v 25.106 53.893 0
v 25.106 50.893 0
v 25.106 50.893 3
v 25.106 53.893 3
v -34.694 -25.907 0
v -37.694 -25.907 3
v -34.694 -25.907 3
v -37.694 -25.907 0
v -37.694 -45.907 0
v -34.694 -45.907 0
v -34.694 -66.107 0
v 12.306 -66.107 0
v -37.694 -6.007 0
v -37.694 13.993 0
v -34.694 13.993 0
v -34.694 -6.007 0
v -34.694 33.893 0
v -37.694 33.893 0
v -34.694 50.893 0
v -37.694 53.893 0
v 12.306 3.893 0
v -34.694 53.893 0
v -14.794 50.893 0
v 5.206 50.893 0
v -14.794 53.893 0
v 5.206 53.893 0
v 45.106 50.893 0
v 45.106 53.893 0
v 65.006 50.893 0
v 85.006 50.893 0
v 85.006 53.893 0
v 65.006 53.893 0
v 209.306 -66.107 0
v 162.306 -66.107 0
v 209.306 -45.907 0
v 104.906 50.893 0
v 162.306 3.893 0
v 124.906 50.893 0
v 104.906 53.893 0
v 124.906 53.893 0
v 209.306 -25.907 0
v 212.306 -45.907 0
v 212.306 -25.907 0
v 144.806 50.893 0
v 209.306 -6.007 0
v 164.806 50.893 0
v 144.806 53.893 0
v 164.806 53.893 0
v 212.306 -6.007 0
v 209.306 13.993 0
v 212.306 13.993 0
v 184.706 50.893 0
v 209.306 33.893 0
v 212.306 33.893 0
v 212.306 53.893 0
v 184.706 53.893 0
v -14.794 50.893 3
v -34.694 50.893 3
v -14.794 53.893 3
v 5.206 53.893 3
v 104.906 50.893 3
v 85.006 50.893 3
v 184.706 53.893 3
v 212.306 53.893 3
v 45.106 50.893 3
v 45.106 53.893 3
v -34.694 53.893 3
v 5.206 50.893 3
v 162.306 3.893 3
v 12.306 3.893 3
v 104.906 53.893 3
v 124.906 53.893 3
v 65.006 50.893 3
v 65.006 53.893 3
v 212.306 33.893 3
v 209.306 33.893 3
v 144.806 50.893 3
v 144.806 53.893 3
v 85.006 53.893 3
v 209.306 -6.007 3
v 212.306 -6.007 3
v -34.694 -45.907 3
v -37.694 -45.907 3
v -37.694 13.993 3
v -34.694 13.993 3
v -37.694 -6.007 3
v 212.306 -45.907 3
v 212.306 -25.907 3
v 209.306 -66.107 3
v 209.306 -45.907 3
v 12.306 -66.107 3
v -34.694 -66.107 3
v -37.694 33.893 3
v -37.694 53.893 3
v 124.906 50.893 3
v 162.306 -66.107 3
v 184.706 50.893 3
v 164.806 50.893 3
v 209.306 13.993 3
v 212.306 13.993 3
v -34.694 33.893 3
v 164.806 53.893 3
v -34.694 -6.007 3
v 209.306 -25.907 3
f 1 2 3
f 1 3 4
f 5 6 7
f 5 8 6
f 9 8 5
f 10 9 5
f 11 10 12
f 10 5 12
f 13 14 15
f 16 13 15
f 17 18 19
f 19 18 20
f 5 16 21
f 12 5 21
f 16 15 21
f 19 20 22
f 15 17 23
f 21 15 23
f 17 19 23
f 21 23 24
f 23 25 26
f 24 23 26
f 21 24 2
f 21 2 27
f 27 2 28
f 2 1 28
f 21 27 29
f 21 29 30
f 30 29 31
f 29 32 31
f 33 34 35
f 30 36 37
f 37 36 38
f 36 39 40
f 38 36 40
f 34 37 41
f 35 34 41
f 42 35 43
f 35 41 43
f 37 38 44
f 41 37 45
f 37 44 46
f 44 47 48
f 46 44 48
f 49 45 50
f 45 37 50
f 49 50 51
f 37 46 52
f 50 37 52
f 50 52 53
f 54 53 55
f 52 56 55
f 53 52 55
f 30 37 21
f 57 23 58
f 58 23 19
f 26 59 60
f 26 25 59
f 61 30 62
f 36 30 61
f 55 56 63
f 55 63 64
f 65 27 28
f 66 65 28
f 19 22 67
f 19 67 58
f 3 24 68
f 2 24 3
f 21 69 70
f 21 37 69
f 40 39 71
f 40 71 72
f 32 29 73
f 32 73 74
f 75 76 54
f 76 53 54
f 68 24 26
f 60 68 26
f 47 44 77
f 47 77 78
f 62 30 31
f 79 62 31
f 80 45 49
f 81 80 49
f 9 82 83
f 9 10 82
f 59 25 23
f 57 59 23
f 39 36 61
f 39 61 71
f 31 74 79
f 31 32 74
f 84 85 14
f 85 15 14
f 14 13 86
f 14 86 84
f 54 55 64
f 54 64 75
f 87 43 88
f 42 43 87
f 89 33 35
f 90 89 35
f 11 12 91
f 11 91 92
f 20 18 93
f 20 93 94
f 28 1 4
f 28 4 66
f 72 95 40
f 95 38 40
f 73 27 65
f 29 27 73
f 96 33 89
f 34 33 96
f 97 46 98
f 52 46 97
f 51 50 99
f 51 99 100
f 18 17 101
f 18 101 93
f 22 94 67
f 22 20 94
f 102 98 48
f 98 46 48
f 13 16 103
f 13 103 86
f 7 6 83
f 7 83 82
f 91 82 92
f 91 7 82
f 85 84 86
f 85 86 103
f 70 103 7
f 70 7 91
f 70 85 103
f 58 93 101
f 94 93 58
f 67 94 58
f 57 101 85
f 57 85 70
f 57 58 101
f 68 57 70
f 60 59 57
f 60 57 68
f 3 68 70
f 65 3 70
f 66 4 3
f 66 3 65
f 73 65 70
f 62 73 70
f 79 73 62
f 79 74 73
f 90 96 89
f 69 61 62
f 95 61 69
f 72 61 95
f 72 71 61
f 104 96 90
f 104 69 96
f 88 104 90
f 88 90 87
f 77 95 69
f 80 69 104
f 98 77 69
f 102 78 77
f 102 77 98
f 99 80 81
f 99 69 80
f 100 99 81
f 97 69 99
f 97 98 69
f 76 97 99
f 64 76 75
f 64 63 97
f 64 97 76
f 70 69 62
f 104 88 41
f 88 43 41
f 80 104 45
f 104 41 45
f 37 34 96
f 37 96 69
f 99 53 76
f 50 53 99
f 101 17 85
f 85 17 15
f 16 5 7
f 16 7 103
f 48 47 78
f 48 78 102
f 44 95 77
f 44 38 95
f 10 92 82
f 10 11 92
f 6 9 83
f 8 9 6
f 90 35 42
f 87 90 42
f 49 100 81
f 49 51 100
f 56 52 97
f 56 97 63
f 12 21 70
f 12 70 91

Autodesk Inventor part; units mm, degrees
ref_plane "YZ Plane" through (0, 0, 0) normal (1, 0, 0) x (0, 1, 0)
ref_plane "XZ Plane" through (0, 0, 0) normal (0, 1, 0) x (-1, 0, 0)
ref_plane "XY Plane" through (0, 0, 0) normal (0, 0, 1) x (1, 0, 0)
sketch "Sketch1" plane through (0, 0, 0) normal (0, 0, 1) x (1, 0, 0)
  line L0 (-37.6936, 53.8926) -> (212.3064, 53.8926)
  line L1 (212.3064, 53.8926) -> (212.3064, -66.1074)
  line L2 (212.3064, -66.1074) -> (-37.6936, -66.1074)
  line L3 (-37.6936, -66.1074) -> (-37.6936, 53.8926)
  line L4 (12.3064, -66.1074) -> (162.3064, -66.1074)
  line L5 (162.3064, -66.1074) -> (162.3064, 3.8926)
  line L6 (162.3064, 3.8926) -> (12.3064, 3.8926)
  line L7 (12.3064, 3.8926) -> (12.3064, -66.1074)
  line L8 (-37.6936, 53.8926) -> (-34.6936, 53.8926)
  line L9 (-34.6936, 53.8926) -> (-34.6936, 33.8926)
  line L10 (-34.6936, 33.8926) -> (-37.6936, 33.8926)
  line L11 (-37.6936, 33.8926) -> (-37.6936, 53.8926)
  line L12 (-37.6936, 33.8926) -> (-34.6936, 33.8926)
  line L13 (-34.6936, 33.8926) -> (-34.6936, 13.9926)
  line L14 (-34.6936, 13.9926) -> (-37.6936, 13.9926)
  line L15 (-37.6936, 13.9926) -> (-37.6936, 33.8926)
  line L16 (-37.6936, 13.9926) -> (-34.6936, 13.9926)
  line L17 (-34.6936, 13.9926) -> (-34.6936, -6.0074)
  line L18 (-34.6936, -6.0074) -> (-37.6936, -6.0074)
  line L19 (-37.6936, -6.0074) -> (-37.6936, 13.9926)
  line L20 (-34.6936, -6.0074) -> (-37.6936, -6.0074)
  line L21 (-37.6936, -6.0074) -> (-37.6936, -25.9074)
  line L22 (-37.6936, -25.9074) -> (-34.6936, -25.9074)
  line L23 (-34.6936, -25.9074) -> (-34.6936, -6.0074)
  line L24 (-37.6936, -25.9074) -> (-34.6936, -25.9074)
  line L25 (-34.6936, -25.9074) -> (-34.6936, -45.9074)
  line L26 (-34.6936, -45.9074) -> (-37.6936, -45.9074)
  line L27 (-37.6936, -45.9074) -> (-37.6936, -25.9074)
  line L28 (-34.6936, -45.9074) -> (-37.6936, -45.9074)
  line L29 (-37.6936, -45.9074) -> (-37.6936, -66.1074)
  line L30 (-37.6936, -66.1074) -> (-34.6936, -66.1074)
  line L31 (-34.6936, -66.1074) -> (-34.6936, -45.9074)
  line L32 (212.3064, -66.1074) -> (212.3064, 53.8926)
  line L33 (212.3064, 53.8926) -> (209.3064, 53.8926)
  line L34 (209.3064, 53.8926) -> (209.3064, 33.8926)
  line L35 (209.3064, 33.8926) -> (212.3064, 33.8926)
  line L36 (212.3064, 33.8926) -> (212.3064, 53.8926)
  line L37 (212.3064, 33.8926) -> (209.3064, 33.8926)
  line L38 (209.3064, 33.8926) -> (209.3064, 13.9926)
  line L39 (209.3064, 13.9926) -> (212.3064, 13.9926)
  line L40 (212.3064, 13.9926) -> (212.3064, 33.8926)
  line L41 (212.3064, 13.9926) -> (209.3064, 13.9926)
  line L42 (209.3064, 13.9926) -> (209.3064, -6.0074)
  line L43 (209.3064, -6.0074) -> (212.3064, -6.0074)
  line L44 (212.3064, -6.0074) -> (212.3064, 13.9926)
  line L45 (209.3064, -6.0074) -> (212.3064, -6.0074)
  line L46 (212.3064, -6.0074) -> (212.3064, -25.9074)
  line L47 (212.3064, -25.9074) -> (209.3064, -25.9074)
  line L48 (209.3064, -25.9074) -> (209.3064, -6.0074)
  line L49 (212.3064, -25.9074) -> (209.3064, -25.9074)
  line L50 (209.3064, -25.9074) -> (209.3064, -45.9074)
  line L51 (209.3064, -45.9074) -> (212.3064, -45.9074)
  line L52 (212.3064, -45.9074) -> (212.3064, -25.9074)
  line L53 (209.3064, -45.9074) -> (212.3064, -45.9074)
  line L54 (212.3064, -45.9074) -> (212.3064, -66.1074)
  line L55 (212.3064, -66.1074) -> (209.3064, -66.1074)
  line L56 (209.3064, -66.1074) -> (209.3064, -45.9074)
  line L57 (-34.6936, 53.8926) -> (-14.7936, 53.8926)
  line L58 (-14.7936, 53.8926) -> (-14.7936, 50.8926)
  line L59 (-14.7936, 50.8926) -> (-34.6936, 50.8926)
  line L60 (-34.6936, 50.8926) -> (-34.6936, 53.8926)
  line L61 (-14.7936, 50.8926) -> (5.2064, 50.8926)
  line L62 (5.2064, 50.8926) -> (5.2064, 53.8926)
  line L63 (5.2064, 53.8926) -> (-14.7936, 53.8926)
  line L64 (-14.7936, 53.8926) -> (-14.7936, 50.8926)
  line L65 (5.2064, 50.8926) -> (25.1064, 50.8926)
  line L66 (25.1064, 50.8926) -> (25.1064, 53.8926)
  line L67 (25.1064, 53.8926) -> (5.2064, 53.8926)
  line L68 (5.2064, 53.8926) -> (5.2064, 50.8926)
  line L69 (25.1064, 50.8926) -> (45.1064, 50.8926)
  line L70 (45.1064, 50.8926) -> (45.1064, 53.8926)
  line L71 (45.1064, 53.8926) -> (25.1064, 53.8926)
  line L72 (25.1064, 53.8926) -> (25.1064, 50.8926)
  line L73 (45.1064, 50.8926) -> (65.0064, 50.8926)
  line L74 (65.0064, 50.8926) -> (65.0064, 53.8926)
  line L75 (65.0064, 53.8926) -> (45.1064, 53.8926)
  line L76 (45.1064, 53.8926) -> (45.1064, 50.8926)
  line L77 (65.0064, 50.8926) -> (85.0064, 50.8926)
  line L78 (85.0064, 50.8926) -> (85.0064, 53.8926)
  line L79 (85.0064, 53.8926) -> (65.0064, 53.8926)
  line L80 (65.0064, 53.8926) -> (65.0064, 50.8926)
  line L81 (85.0064, 50.8926) -> (104.9064, 50.8926)
  line L82 (104.9064, 50.8926) -> (104.9064, 53.8926)
  line L83 (104.9064, 53.8926) -> (85.0064, 53.8926)
  line L84 (85.0064, 53.8926) -> (85.0064, 50.8926)
  line L85 (104.9064, 50.8926) -> (124.9064, 50.8926)
  line L86 (124.9064, 50.8926) -> (124.9064, 53.8926)
  line L87 (124.9064, 53.8926) -> (104.9064, 53.8926)
  line L88 (104.9064, 53.8926) -> (104.9064, 50.8926)
  line L89 (124.9064, 50.8926) -> (144.8064, 50.8926)
  line L90 (144.8064, 50.8926) -> (144.8064, 53.8926)
  line L91 (144.8064, 53.8926) -> (124.9064, 53.8926)
  line L92 (124.9064, 53.8926) -> (124.9064, 50.8926)
  line L93 (144.8064, 50.8926) -> (164.8064, 50.8926)
  line L94 (164.8064, 50.8926) -> (164.8064, 53.8926)
  line L95 (164.8064, 53.8926) -> (144.8064, 53.8926)
  line L96 (144.8064, 53.8926) -> (144.8064, 50.8926)
  line L97 (164.8064, 50.8926) -> (184.7064, 50.8926)
  line L98 (184.7064, 50.8926) -> (184.7064, 53.8926)
  line L99 (184.7064, 53.8926) -> (164.8064, 53.8926)
  line L100 (164.8064, 53.8926) -> (164.8064, 50.8926)
  line L101 (184.7064, 50.8926) -> (209.3064, 50.8926)
  line L102 (209.3064, 50.8926) -> (209.3064, 53.8926)
  line L103 (209.3064, 53.8926) -> (184.7064, 53.8926)
  line L104 (184.7064, 53.8926) -> (184.7064, 50.8926)
  point P0 (0, 0)
  point P1 (212.3064, -45.9074)
  point P2 (212.3064, -25.9074)
  point P3 (212.3064, -6.0074)
  point P4 (212.3064, 13.9926)
  point P5 (212.3064, 33.8926)
  point P6 (-37.6936, 13.9926)
  point P7 (-14.7936, 53.8926)
  point P8 (-34.6936, 50.8926)
  point P9 (209.3064, 53.8926)
  point P10 (212.3064, 13.9926)
  point P11 (212.3064, 23.9426)
  point P12 (209.3064, 23.9426)
  point P13 (212.3064, -15.9574)
  point P14 (209.3064, -15.9574)
  dimension "d0" = 250
  dimension "d1" = 120
  dimension "d14" = 150
  dimension "d15" = 70
  dimension "d16" = 50
  dimension "d17" = 3
  dimension "d18" = 20
  dimension "d19" = 19.9
  dimension "d20" = 20
  dimension "d21" = 19.9
  dimension "d22" = 20
  dimension "d25" = 19.9
  dimension "d26" = 3
  dimension "d27" = 20
  dimension "d28" = 19.9
  dimension "d29" = 20
  dimension "d30" = 19.9
  dimension "d31" = 20
  dimension "d32" = 19.9
  dimension "d33" = 20
  dimension "d34" = 19.9
  dimension "d35" = 20
  dimension "d36" = 19.9
  dimension "d37" = 3
  dimension "d38" = 3
extrude "Extrusion1" add sketch "Sketch1" along normal blind 3 contours L0 L9 L10 L3 | L0 L62 L61 L58 | L59 L61 L65 L69 L73 L77 L81 L85 L89 L93 L97 L101 L34 L38 L42 L48 L50 L56 L2 L5 L6 L7 L31 L25 L23 L17 L13 L9 | L14 L17 L18 L3 | L0 L70 L69 L66 | L22 L25 L26 L3 | L0 L78 L77 L74 | L0 L86 L85 L82 | L0 L94 L93 L90 | L50 L47 L1 L51 | L0 L34 L101 L98 | L0 L1 L35 L34 | L42 L39 L1 L43
equation "\"d16\" = -0.5 * d14 + 0.5 * d0"
equation "\"d19\" = d25"
equation "\"d21\" = d25"
equation "\"d28\" = d25"
equation "\"d30\" = d25"
